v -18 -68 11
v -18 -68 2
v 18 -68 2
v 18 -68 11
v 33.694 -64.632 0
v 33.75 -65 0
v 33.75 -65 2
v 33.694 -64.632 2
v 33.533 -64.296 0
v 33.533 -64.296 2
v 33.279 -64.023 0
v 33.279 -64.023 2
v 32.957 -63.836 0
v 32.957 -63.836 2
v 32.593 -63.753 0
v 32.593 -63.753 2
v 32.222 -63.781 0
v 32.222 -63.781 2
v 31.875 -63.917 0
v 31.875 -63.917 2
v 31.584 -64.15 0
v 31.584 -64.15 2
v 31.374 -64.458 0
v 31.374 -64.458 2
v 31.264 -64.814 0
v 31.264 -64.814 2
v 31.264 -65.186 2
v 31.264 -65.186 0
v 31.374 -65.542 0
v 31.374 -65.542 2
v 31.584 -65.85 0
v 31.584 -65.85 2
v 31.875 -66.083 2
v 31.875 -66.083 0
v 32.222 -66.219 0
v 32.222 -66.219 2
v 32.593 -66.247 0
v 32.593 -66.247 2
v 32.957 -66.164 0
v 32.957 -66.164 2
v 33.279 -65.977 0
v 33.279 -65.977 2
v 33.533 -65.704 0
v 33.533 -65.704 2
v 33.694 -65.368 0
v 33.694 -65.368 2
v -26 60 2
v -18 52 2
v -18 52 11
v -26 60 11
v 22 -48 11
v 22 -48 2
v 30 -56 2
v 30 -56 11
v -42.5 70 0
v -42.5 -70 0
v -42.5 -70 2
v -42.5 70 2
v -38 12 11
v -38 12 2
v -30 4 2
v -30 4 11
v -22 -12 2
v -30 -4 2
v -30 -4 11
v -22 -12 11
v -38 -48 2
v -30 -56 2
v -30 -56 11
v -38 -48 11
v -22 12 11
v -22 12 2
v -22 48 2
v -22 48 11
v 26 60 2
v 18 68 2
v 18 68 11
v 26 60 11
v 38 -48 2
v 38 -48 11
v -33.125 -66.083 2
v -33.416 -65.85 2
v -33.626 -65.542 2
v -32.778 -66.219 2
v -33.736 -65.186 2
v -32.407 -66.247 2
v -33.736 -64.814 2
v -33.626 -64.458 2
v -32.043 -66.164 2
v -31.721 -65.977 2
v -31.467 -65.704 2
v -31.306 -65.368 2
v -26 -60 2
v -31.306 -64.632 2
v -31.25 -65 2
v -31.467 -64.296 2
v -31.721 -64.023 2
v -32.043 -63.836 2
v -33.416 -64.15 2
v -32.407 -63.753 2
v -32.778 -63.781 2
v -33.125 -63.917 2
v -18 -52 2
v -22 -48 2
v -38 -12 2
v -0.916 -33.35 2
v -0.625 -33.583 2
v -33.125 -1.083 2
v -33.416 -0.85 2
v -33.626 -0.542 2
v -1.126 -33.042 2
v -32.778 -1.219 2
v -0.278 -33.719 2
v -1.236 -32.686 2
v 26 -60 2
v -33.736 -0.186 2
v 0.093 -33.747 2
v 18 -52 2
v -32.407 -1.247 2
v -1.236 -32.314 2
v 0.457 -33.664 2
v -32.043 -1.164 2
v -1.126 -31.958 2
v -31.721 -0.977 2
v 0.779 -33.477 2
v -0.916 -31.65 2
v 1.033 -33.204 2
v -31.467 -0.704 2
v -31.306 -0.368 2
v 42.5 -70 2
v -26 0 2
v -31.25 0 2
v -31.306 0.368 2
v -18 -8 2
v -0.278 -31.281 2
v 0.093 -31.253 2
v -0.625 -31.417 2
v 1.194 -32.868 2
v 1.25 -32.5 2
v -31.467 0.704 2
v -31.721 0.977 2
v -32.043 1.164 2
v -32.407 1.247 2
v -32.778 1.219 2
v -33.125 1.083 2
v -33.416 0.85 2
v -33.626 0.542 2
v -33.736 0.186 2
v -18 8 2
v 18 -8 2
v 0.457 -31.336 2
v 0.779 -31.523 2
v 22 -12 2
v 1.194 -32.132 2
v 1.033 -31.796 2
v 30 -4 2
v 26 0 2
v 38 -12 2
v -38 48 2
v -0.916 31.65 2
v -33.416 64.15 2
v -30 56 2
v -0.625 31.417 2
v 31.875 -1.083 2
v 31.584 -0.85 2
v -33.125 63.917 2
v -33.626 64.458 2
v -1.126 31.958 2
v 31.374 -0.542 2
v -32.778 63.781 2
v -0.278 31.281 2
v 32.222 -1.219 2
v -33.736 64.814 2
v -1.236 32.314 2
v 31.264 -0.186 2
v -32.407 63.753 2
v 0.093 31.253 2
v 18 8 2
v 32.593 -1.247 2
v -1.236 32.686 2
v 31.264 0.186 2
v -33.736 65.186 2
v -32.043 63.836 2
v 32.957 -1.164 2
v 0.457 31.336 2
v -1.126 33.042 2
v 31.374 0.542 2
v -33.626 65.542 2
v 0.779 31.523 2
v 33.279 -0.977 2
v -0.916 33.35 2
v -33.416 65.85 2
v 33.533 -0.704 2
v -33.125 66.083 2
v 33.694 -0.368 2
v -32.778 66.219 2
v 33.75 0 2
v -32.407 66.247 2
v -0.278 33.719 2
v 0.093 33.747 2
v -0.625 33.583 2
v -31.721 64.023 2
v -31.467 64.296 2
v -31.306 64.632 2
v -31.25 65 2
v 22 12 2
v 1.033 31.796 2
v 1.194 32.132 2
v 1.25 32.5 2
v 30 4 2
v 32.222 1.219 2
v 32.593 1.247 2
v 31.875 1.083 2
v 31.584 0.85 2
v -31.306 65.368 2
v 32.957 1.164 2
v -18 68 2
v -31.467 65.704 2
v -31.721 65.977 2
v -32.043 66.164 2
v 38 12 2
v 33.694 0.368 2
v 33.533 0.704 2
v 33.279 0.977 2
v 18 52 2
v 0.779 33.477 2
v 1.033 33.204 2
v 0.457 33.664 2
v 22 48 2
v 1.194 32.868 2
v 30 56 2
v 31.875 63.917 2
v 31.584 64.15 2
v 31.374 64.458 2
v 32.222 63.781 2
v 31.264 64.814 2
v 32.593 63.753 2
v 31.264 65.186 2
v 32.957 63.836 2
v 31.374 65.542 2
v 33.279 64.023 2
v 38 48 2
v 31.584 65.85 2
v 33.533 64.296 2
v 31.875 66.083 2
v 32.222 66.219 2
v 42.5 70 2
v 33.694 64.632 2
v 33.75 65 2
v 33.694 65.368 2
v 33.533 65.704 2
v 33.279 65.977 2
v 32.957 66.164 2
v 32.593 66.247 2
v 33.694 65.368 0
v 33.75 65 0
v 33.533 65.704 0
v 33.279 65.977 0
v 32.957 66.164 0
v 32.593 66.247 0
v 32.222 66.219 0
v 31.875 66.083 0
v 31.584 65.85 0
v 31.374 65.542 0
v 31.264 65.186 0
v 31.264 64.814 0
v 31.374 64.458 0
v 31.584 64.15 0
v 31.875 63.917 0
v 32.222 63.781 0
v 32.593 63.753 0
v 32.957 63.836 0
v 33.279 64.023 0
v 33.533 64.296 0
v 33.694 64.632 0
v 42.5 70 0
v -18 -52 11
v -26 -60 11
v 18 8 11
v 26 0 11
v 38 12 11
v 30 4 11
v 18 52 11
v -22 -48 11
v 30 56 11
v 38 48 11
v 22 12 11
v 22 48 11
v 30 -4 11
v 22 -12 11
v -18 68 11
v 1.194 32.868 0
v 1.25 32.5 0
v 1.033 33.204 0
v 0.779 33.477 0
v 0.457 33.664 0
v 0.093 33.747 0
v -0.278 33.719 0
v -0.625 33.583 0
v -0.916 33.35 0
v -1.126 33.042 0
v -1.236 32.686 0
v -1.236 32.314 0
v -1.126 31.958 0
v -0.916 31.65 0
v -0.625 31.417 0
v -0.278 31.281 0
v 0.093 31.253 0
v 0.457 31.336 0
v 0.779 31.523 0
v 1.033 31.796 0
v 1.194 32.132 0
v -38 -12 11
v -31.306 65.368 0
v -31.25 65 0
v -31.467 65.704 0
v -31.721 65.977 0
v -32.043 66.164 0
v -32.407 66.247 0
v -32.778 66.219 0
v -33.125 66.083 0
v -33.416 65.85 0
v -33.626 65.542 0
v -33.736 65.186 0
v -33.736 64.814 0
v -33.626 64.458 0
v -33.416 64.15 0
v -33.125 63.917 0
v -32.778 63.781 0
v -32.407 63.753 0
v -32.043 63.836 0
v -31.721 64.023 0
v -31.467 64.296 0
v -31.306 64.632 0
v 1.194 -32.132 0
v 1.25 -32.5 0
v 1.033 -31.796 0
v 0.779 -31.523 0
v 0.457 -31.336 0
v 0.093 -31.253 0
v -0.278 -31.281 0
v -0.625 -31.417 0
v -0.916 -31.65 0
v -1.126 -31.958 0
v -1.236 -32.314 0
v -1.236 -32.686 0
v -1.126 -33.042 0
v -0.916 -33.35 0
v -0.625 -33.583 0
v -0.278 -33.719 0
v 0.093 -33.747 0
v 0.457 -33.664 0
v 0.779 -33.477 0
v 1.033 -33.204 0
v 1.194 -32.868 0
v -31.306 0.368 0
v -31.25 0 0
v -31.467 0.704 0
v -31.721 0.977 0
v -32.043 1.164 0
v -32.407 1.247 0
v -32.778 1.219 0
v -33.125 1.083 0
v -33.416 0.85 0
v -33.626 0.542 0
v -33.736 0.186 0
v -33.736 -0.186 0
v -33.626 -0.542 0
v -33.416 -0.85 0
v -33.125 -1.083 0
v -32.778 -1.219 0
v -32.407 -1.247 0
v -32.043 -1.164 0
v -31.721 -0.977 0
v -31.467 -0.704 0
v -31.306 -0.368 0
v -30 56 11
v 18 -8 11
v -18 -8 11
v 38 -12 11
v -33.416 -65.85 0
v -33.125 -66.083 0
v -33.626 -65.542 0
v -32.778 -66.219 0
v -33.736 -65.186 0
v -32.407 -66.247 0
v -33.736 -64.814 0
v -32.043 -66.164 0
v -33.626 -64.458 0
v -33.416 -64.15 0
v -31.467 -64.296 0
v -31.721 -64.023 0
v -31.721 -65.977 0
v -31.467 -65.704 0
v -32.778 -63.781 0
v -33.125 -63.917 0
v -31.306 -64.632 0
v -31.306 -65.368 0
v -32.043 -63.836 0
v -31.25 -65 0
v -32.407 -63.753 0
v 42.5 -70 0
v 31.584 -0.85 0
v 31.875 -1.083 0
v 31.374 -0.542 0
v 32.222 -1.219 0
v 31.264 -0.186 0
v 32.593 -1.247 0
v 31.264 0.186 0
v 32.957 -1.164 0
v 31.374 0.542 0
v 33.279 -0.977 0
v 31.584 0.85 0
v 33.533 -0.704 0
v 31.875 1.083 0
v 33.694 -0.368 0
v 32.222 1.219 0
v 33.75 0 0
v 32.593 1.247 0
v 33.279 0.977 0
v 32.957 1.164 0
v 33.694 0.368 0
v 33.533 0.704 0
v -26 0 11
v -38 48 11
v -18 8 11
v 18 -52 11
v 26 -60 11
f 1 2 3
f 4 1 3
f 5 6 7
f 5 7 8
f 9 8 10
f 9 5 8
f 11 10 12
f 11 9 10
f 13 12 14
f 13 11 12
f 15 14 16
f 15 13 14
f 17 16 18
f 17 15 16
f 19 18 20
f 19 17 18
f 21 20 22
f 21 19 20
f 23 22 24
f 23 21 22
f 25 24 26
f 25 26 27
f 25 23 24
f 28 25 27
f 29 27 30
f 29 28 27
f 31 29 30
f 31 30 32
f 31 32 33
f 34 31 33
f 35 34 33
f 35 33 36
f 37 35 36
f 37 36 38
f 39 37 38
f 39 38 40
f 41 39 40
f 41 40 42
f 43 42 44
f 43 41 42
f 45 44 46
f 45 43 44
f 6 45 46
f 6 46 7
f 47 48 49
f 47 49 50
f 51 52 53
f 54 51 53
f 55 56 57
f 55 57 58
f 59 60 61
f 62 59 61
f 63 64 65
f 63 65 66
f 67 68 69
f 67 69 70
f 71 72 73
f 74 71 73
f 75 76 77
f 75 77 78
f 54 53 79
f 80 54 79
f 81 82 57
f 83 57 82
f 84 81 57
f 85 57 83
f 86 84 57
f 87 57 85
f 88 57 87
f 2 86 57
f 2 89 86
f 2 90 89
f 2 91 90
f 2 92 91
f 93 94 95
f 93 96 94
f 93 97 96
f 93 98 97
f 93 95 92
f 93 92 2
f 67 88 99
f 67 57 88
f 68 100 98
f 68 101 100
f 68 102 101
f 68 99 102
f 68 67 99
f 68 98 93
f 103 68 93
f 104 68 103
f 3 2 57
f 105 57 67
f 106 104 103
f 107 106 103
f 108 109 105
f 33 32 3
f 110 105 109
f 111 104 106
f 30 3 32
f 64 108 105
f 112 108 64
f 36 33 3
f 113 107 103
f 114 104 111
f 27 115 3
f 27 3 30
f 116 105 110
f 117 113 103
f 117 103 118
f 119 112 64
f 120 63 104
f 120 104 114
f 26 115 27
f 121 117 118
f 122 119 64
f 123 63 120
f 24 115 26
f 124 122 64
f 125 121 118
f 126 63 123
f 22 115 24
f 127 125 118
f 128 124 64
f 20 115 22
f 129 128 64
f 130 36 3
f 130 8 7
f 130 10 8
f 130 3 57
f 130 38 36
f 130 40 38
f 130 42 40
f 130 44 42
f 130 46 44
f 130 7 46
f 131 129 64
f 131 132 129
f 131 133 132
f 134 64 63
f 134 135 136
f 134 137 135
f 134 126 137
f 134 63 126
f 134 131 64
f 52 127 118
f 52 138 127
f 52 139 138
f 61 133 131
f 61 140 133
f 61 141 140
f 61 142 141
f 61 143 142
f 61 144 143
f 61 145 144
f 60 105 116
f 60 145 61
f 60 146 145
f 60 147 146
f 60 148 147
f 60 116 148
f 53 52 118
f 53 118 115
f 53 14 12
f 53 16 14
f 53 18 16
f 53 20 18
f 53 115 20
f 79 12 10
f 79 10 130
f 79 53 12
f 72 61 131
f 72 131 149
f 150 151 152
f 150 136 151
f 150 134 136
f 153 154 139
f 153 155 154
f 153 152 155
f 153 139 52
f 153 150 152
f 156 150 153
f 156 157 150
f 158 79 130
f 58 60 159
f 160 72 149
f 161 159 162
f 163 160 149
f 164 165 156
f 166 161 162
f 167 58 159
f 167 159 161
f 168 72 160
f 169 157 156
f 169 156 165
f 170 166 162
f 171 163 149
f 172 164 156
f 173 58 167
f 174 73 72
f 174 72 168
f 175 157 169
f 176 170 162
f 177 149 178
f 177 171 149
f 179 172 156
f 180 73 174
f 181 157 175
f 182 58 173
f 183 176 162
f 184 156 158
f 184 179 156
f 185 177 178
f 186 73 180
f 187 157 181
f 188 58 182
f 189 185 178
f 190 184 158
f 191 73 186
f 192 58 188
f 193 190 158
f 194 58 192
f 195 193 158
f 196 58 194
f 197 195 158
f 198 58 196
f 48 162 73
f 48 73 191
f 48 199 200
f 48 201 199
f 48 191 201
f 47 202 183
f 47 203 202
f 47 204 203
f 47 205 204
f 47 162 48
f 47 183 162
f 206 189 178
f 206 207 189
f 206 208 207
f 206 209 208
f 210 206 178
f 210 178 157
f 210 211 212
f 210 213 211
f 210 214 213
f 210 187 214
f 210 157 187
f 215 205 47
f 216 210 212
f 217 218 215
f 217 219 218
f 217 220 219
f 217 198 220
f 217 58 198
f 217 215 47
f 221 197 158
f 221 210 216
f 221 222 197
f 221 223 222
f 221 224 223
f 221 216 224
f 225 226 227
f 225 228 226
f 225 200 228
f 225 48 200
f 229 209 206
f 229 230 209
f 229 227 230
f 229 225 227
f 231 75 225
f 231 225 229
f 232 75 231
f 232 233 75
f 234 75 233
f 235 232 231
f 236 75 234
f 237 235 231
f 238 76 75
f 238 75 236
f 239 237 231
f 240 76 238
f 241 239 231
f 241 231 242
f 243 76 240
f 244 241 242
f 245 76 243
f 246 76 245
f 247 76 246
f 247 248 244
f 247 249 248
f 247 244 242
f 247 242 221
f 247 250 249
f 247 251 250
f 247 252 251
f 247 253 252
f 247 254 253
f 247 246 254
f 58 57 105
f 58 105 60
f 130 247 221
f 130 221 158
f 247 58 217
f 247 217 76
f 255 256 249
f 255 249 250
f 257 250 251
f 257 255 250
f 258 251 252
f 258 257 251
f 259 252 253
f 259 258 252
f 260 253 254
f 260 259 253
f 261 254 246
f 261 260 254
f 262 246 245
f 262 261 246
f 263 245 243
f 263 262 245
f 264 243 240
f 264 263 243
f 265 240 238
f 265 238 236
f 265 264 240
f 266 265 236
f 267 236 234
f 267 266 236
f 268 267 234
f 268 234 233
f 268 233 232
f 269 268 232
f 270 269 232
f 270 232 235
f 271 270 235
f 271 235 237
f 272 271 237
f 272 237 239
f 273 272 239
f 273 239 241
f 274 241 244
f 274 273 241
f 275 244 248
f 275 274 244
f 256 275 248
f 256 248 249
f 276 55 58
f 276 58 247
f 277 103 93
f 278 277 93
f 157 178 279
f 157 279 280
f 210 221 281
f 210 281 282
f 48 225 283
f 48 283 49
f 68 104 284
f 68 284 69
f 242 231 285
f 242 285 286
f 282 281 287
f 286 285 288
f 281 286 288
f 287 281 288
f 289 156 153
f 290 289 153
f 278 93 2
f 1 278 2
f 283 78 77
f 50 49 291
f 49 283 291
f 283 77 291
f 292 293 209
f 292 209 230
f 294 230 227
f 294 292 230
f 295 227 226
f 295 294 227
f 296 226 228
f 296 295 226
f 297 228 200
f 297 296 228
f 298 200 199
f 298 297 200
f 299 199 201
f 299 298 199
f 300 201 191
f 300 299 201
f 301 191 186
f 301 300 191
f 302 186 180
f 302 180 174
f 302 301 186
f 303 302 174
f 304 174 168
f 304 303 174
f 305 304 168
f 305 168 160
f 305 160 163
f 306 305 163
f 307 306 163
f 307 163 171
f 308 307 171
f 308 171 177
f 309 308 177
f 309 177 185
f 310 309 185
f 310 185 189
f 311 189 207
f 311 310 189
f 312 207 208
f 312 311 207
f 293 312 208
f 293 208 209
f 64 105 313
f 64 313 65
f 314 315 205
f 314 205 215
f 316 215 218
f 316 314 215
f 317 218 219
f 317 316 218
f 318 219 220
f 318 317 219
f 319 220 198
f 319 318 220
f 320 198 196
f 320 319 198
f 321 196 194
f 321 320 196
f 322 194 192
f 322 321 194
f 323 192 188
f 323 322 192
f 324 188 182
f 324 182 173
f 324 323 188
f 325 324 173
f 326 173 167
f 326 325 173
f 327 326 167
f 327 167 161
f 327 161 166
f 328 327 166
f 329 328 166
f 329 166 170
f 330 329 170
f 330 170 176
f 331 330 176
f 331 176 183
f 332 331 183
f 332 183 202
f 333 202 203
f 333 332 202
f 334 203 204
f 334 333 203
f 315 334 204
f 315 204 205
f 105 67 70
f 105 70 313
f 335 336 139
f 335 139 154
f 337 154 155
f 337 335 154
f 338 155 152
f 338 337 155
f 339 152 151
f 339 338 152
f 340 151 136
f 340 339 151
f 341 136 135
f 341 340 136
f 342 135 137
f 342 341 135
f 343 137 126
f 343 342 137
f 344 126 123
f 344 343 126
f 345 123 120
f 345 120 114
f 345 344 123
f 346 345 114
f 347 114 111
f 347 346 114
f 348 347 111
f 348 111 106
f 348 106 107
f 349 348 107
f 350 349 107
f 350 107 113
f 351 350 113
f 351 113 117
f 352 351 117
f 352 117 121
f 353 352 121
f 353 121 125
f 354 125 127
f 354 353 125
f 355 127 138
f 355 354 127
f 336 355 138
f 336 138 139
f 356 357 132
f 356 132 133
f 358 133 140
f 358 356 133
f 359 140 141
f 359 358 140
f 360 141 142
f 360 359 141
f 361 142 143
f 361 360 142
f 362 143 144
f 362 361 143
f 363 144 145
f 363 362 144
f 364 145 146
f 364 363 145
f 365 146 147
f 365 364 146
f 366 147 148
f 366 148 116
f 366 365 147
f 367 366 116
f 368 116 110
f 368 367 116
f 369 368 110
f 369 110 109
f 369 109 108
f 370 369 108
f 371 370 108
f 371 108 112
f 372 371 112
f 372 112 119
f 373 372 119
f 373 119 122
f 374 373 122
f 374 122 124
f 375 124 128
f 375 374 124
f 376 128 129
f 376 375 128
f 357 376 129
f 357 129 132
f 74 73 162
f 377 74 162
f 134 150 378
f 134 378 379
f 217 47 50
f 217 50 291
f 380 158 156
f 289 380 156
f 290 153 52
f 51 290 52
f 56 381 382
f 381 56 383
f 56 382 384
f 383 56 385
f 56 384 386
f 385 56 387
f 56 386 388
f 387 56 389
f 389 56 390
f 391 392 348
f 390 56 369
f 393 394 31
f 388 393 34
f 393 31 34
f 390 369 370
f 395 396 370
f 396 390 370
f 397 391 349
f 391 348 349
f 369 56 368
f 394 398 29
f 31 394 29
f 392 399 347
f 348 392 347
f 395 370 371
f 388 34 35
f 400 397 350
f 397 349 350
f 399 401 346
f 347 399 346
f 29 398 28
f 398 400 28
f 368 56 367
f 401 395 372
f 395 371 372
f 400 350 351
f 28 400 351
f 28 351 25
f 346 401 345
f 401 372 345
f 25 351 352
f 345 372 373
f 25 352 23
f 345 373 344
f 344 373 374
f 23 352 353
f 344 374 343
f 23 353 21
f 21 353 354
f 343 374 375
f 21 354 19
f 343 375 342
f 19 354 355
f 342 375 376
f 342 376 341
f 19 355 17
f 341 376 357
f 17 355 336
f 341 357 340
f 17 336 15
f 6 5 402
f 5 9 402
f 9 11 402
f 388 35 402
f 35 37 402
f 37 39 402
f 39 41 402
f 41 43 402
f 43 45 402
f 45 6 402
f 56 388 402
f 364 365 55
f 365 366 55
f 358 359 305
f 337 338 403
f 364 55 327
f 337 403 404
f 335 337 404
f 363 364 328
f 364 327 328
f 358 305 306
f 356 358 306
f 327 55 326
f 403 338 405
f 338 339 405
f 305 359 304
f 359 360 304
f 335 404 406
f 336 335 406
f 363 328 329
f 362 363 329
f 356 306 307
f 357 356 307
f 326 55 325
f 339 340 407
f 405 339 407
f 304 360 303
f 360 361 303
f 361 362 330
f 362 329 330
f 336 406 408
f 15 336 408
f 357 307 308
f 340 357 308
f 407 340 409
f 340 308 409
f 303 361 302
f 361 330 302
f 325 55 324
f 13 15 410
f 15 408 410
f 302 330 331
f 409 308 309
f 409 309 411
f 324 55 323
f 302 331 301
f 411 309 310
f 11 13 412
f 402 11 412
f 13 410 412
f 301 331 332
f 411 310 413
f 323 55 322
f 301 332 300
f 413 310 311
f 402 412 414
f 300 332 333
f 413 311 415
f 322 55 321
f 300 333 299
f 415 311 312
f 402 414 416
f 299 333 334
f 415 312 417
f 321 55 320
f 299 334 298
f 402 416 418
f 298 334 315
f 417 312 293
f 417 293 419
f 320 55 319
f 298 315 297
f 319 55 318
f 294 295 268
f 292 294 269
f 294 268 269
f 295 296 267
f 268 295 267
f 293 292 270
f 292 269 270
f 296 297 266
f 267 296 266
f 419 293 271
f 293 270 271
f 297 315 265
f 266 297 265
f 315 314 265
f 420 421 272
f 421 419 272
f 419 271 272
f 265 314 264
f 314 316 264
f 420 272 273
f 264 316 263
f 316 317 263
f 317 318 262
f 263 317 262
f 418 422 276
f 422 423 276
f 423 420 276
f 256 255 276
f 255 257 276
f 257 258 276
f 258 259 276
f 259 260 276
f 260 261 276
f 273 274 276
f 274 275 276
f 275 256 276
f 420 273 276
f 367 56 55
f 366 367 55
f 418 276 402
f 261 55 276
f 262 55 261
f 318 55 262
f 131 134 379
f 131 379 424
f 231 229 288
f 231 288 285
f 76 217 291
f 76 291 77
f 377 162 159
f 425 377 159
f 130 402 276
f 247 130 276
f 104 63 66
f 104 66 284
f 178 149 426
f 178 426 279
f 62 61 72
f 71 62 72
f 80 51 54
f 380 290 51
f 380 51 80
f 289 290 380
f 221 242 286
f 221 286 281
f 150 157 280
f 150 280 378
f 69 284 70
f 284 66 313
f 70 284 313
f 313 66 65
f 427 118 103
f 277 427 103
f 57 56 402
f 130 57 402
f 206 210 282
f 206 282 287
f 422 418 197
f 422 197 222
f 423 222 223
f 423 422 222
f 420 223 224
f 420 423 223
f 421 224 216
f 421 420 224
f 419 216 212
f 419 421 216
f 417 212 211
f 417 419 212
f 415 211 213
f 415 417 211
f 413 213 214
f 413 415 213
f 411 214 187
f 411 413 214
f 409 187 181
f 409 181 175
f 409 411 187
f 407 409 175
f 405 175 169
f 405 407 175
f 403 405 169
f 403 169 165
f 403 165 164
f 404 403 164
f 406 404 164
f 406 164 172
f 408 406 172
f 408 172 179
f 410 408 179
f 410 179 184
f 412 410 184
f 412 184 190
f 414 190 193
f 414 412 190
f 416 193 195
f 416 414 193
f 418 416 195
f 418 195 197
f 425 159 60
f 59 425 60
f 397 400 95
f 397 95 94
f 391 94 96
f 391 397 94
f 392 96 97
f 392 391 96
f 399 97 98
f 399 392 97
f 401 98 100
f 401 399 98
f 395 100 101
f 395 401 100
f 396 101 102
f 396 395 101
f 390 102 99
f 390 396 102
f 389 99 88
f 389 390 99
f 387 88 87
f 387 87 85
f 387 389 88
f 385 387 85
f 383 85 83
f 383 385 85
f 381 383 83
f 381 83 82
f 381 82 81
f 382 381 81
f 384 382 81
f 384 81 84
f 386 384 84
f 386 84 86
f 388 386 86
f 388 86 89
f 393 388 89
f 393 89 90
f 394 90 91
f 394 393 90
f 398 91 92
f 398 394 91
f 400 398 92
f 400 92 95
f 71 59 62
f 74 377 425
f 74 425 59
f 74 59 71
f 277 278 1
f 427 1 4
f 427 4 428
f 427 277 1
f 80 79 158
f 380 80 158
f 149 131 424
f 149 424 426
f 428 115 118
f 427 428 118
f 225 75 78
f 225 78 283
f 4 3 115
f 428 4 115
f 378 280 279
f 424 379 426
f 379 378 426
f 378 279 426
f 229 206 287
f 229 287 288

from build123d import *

# Parameters (mm, degrees)
CROQUIS1_W              = 85
CROQUIS1_H              = 140
CROQUIS1_R              = 1.25
SALIENTE_EXTRUIR1_DEPTH = 2
SALIENTE_EXTRUIR2_DEPTH = 9


with BuildPart() as part:
    # Croquis1 → Saliente-Extruir1 (new body)
    with BuildSketch(Plane.XY):
        Rectangle(CROQUIS1_W, CROQUIS1_H)
        with Locations((-32.5, 65)):
            Circle(CROQUIS1_R, mode=Mode.SUBTRACT)
        with Locations((32.5, 65)):
            Circle(CROQUIS1_R, mode=Mode.SUBTRACT)
        with Locations((-32.5, 0)):
            Circle(CROQUIS1_R, mode=Mode.SUBTRACT)
        with Locations((32.5, 0)):
            Circle(CROQUIS1_R, mode=Mode.SUBTRACT)
        with Locations((-32.5, -65)):
            Circle(CROQUIS1_R, mode=Mode.SUBTRACT)
        with Locations((32.5, -65)):
            Circle(CROQUIS1_R, mode=Mode.SUBTRACT)
        with Locations((0, -32.5)):
            Circle(CROQUIS1_R, mode=Mode.SUBTRACT)
        with Locations((0, 32.5)):
            Circle(CROQUIS1_R, mode=Mode.SUBTRACT)
    extrude(amount=SALIENTE_EXTRUIR1_DEPTH)

    # Croquis2 → Saliente-Extruir2 (add)
    with BuildSketch(Plane.XY.offset(2)):
        Polygon((22, 48), (30, 56), (38, 48), (38, 12), (30, 4), (22, 12), align=None)
        Polygon((-22, 48), (-30, 56), (-38, 48), (-38, 12), (-30, 4), (-22, 12), align=None)
        Polygon((22, -48), (30, -56), (38, -48), (38, -12), (30, -4), (22, -12), align=None)
        Polygon((-22, -48), (-30, -56), (-38, -48), (-38, -12), (-30, -4), (-22, -12), align=None)
        Polygon((-18, -8), (-26, 0), (-18, 8), (18, 8), (26, 0), (18, -8), align=None)
        Polygon((-18.000001585, 52.000001585), (-26.000001585, 60.000001585), (-18.000001585, 68.000001585), (17.999998415, 68.000001585), (25.999998415, 60.000001585), (17.999998415, 52.000001585), align=None)
        Polygon((-18.000001585, -52.000001585), (-26.000001585, -60.000001585), (-18.000001585, -68.000001585), (17.999998415, -68.000001585), (25.999998415, -60.000001585), (17.999998415, -52.000001585), align=None)
    extrude(amount=SALIENTE_EXTRUIR2_DEPTH)


solid = part.part
